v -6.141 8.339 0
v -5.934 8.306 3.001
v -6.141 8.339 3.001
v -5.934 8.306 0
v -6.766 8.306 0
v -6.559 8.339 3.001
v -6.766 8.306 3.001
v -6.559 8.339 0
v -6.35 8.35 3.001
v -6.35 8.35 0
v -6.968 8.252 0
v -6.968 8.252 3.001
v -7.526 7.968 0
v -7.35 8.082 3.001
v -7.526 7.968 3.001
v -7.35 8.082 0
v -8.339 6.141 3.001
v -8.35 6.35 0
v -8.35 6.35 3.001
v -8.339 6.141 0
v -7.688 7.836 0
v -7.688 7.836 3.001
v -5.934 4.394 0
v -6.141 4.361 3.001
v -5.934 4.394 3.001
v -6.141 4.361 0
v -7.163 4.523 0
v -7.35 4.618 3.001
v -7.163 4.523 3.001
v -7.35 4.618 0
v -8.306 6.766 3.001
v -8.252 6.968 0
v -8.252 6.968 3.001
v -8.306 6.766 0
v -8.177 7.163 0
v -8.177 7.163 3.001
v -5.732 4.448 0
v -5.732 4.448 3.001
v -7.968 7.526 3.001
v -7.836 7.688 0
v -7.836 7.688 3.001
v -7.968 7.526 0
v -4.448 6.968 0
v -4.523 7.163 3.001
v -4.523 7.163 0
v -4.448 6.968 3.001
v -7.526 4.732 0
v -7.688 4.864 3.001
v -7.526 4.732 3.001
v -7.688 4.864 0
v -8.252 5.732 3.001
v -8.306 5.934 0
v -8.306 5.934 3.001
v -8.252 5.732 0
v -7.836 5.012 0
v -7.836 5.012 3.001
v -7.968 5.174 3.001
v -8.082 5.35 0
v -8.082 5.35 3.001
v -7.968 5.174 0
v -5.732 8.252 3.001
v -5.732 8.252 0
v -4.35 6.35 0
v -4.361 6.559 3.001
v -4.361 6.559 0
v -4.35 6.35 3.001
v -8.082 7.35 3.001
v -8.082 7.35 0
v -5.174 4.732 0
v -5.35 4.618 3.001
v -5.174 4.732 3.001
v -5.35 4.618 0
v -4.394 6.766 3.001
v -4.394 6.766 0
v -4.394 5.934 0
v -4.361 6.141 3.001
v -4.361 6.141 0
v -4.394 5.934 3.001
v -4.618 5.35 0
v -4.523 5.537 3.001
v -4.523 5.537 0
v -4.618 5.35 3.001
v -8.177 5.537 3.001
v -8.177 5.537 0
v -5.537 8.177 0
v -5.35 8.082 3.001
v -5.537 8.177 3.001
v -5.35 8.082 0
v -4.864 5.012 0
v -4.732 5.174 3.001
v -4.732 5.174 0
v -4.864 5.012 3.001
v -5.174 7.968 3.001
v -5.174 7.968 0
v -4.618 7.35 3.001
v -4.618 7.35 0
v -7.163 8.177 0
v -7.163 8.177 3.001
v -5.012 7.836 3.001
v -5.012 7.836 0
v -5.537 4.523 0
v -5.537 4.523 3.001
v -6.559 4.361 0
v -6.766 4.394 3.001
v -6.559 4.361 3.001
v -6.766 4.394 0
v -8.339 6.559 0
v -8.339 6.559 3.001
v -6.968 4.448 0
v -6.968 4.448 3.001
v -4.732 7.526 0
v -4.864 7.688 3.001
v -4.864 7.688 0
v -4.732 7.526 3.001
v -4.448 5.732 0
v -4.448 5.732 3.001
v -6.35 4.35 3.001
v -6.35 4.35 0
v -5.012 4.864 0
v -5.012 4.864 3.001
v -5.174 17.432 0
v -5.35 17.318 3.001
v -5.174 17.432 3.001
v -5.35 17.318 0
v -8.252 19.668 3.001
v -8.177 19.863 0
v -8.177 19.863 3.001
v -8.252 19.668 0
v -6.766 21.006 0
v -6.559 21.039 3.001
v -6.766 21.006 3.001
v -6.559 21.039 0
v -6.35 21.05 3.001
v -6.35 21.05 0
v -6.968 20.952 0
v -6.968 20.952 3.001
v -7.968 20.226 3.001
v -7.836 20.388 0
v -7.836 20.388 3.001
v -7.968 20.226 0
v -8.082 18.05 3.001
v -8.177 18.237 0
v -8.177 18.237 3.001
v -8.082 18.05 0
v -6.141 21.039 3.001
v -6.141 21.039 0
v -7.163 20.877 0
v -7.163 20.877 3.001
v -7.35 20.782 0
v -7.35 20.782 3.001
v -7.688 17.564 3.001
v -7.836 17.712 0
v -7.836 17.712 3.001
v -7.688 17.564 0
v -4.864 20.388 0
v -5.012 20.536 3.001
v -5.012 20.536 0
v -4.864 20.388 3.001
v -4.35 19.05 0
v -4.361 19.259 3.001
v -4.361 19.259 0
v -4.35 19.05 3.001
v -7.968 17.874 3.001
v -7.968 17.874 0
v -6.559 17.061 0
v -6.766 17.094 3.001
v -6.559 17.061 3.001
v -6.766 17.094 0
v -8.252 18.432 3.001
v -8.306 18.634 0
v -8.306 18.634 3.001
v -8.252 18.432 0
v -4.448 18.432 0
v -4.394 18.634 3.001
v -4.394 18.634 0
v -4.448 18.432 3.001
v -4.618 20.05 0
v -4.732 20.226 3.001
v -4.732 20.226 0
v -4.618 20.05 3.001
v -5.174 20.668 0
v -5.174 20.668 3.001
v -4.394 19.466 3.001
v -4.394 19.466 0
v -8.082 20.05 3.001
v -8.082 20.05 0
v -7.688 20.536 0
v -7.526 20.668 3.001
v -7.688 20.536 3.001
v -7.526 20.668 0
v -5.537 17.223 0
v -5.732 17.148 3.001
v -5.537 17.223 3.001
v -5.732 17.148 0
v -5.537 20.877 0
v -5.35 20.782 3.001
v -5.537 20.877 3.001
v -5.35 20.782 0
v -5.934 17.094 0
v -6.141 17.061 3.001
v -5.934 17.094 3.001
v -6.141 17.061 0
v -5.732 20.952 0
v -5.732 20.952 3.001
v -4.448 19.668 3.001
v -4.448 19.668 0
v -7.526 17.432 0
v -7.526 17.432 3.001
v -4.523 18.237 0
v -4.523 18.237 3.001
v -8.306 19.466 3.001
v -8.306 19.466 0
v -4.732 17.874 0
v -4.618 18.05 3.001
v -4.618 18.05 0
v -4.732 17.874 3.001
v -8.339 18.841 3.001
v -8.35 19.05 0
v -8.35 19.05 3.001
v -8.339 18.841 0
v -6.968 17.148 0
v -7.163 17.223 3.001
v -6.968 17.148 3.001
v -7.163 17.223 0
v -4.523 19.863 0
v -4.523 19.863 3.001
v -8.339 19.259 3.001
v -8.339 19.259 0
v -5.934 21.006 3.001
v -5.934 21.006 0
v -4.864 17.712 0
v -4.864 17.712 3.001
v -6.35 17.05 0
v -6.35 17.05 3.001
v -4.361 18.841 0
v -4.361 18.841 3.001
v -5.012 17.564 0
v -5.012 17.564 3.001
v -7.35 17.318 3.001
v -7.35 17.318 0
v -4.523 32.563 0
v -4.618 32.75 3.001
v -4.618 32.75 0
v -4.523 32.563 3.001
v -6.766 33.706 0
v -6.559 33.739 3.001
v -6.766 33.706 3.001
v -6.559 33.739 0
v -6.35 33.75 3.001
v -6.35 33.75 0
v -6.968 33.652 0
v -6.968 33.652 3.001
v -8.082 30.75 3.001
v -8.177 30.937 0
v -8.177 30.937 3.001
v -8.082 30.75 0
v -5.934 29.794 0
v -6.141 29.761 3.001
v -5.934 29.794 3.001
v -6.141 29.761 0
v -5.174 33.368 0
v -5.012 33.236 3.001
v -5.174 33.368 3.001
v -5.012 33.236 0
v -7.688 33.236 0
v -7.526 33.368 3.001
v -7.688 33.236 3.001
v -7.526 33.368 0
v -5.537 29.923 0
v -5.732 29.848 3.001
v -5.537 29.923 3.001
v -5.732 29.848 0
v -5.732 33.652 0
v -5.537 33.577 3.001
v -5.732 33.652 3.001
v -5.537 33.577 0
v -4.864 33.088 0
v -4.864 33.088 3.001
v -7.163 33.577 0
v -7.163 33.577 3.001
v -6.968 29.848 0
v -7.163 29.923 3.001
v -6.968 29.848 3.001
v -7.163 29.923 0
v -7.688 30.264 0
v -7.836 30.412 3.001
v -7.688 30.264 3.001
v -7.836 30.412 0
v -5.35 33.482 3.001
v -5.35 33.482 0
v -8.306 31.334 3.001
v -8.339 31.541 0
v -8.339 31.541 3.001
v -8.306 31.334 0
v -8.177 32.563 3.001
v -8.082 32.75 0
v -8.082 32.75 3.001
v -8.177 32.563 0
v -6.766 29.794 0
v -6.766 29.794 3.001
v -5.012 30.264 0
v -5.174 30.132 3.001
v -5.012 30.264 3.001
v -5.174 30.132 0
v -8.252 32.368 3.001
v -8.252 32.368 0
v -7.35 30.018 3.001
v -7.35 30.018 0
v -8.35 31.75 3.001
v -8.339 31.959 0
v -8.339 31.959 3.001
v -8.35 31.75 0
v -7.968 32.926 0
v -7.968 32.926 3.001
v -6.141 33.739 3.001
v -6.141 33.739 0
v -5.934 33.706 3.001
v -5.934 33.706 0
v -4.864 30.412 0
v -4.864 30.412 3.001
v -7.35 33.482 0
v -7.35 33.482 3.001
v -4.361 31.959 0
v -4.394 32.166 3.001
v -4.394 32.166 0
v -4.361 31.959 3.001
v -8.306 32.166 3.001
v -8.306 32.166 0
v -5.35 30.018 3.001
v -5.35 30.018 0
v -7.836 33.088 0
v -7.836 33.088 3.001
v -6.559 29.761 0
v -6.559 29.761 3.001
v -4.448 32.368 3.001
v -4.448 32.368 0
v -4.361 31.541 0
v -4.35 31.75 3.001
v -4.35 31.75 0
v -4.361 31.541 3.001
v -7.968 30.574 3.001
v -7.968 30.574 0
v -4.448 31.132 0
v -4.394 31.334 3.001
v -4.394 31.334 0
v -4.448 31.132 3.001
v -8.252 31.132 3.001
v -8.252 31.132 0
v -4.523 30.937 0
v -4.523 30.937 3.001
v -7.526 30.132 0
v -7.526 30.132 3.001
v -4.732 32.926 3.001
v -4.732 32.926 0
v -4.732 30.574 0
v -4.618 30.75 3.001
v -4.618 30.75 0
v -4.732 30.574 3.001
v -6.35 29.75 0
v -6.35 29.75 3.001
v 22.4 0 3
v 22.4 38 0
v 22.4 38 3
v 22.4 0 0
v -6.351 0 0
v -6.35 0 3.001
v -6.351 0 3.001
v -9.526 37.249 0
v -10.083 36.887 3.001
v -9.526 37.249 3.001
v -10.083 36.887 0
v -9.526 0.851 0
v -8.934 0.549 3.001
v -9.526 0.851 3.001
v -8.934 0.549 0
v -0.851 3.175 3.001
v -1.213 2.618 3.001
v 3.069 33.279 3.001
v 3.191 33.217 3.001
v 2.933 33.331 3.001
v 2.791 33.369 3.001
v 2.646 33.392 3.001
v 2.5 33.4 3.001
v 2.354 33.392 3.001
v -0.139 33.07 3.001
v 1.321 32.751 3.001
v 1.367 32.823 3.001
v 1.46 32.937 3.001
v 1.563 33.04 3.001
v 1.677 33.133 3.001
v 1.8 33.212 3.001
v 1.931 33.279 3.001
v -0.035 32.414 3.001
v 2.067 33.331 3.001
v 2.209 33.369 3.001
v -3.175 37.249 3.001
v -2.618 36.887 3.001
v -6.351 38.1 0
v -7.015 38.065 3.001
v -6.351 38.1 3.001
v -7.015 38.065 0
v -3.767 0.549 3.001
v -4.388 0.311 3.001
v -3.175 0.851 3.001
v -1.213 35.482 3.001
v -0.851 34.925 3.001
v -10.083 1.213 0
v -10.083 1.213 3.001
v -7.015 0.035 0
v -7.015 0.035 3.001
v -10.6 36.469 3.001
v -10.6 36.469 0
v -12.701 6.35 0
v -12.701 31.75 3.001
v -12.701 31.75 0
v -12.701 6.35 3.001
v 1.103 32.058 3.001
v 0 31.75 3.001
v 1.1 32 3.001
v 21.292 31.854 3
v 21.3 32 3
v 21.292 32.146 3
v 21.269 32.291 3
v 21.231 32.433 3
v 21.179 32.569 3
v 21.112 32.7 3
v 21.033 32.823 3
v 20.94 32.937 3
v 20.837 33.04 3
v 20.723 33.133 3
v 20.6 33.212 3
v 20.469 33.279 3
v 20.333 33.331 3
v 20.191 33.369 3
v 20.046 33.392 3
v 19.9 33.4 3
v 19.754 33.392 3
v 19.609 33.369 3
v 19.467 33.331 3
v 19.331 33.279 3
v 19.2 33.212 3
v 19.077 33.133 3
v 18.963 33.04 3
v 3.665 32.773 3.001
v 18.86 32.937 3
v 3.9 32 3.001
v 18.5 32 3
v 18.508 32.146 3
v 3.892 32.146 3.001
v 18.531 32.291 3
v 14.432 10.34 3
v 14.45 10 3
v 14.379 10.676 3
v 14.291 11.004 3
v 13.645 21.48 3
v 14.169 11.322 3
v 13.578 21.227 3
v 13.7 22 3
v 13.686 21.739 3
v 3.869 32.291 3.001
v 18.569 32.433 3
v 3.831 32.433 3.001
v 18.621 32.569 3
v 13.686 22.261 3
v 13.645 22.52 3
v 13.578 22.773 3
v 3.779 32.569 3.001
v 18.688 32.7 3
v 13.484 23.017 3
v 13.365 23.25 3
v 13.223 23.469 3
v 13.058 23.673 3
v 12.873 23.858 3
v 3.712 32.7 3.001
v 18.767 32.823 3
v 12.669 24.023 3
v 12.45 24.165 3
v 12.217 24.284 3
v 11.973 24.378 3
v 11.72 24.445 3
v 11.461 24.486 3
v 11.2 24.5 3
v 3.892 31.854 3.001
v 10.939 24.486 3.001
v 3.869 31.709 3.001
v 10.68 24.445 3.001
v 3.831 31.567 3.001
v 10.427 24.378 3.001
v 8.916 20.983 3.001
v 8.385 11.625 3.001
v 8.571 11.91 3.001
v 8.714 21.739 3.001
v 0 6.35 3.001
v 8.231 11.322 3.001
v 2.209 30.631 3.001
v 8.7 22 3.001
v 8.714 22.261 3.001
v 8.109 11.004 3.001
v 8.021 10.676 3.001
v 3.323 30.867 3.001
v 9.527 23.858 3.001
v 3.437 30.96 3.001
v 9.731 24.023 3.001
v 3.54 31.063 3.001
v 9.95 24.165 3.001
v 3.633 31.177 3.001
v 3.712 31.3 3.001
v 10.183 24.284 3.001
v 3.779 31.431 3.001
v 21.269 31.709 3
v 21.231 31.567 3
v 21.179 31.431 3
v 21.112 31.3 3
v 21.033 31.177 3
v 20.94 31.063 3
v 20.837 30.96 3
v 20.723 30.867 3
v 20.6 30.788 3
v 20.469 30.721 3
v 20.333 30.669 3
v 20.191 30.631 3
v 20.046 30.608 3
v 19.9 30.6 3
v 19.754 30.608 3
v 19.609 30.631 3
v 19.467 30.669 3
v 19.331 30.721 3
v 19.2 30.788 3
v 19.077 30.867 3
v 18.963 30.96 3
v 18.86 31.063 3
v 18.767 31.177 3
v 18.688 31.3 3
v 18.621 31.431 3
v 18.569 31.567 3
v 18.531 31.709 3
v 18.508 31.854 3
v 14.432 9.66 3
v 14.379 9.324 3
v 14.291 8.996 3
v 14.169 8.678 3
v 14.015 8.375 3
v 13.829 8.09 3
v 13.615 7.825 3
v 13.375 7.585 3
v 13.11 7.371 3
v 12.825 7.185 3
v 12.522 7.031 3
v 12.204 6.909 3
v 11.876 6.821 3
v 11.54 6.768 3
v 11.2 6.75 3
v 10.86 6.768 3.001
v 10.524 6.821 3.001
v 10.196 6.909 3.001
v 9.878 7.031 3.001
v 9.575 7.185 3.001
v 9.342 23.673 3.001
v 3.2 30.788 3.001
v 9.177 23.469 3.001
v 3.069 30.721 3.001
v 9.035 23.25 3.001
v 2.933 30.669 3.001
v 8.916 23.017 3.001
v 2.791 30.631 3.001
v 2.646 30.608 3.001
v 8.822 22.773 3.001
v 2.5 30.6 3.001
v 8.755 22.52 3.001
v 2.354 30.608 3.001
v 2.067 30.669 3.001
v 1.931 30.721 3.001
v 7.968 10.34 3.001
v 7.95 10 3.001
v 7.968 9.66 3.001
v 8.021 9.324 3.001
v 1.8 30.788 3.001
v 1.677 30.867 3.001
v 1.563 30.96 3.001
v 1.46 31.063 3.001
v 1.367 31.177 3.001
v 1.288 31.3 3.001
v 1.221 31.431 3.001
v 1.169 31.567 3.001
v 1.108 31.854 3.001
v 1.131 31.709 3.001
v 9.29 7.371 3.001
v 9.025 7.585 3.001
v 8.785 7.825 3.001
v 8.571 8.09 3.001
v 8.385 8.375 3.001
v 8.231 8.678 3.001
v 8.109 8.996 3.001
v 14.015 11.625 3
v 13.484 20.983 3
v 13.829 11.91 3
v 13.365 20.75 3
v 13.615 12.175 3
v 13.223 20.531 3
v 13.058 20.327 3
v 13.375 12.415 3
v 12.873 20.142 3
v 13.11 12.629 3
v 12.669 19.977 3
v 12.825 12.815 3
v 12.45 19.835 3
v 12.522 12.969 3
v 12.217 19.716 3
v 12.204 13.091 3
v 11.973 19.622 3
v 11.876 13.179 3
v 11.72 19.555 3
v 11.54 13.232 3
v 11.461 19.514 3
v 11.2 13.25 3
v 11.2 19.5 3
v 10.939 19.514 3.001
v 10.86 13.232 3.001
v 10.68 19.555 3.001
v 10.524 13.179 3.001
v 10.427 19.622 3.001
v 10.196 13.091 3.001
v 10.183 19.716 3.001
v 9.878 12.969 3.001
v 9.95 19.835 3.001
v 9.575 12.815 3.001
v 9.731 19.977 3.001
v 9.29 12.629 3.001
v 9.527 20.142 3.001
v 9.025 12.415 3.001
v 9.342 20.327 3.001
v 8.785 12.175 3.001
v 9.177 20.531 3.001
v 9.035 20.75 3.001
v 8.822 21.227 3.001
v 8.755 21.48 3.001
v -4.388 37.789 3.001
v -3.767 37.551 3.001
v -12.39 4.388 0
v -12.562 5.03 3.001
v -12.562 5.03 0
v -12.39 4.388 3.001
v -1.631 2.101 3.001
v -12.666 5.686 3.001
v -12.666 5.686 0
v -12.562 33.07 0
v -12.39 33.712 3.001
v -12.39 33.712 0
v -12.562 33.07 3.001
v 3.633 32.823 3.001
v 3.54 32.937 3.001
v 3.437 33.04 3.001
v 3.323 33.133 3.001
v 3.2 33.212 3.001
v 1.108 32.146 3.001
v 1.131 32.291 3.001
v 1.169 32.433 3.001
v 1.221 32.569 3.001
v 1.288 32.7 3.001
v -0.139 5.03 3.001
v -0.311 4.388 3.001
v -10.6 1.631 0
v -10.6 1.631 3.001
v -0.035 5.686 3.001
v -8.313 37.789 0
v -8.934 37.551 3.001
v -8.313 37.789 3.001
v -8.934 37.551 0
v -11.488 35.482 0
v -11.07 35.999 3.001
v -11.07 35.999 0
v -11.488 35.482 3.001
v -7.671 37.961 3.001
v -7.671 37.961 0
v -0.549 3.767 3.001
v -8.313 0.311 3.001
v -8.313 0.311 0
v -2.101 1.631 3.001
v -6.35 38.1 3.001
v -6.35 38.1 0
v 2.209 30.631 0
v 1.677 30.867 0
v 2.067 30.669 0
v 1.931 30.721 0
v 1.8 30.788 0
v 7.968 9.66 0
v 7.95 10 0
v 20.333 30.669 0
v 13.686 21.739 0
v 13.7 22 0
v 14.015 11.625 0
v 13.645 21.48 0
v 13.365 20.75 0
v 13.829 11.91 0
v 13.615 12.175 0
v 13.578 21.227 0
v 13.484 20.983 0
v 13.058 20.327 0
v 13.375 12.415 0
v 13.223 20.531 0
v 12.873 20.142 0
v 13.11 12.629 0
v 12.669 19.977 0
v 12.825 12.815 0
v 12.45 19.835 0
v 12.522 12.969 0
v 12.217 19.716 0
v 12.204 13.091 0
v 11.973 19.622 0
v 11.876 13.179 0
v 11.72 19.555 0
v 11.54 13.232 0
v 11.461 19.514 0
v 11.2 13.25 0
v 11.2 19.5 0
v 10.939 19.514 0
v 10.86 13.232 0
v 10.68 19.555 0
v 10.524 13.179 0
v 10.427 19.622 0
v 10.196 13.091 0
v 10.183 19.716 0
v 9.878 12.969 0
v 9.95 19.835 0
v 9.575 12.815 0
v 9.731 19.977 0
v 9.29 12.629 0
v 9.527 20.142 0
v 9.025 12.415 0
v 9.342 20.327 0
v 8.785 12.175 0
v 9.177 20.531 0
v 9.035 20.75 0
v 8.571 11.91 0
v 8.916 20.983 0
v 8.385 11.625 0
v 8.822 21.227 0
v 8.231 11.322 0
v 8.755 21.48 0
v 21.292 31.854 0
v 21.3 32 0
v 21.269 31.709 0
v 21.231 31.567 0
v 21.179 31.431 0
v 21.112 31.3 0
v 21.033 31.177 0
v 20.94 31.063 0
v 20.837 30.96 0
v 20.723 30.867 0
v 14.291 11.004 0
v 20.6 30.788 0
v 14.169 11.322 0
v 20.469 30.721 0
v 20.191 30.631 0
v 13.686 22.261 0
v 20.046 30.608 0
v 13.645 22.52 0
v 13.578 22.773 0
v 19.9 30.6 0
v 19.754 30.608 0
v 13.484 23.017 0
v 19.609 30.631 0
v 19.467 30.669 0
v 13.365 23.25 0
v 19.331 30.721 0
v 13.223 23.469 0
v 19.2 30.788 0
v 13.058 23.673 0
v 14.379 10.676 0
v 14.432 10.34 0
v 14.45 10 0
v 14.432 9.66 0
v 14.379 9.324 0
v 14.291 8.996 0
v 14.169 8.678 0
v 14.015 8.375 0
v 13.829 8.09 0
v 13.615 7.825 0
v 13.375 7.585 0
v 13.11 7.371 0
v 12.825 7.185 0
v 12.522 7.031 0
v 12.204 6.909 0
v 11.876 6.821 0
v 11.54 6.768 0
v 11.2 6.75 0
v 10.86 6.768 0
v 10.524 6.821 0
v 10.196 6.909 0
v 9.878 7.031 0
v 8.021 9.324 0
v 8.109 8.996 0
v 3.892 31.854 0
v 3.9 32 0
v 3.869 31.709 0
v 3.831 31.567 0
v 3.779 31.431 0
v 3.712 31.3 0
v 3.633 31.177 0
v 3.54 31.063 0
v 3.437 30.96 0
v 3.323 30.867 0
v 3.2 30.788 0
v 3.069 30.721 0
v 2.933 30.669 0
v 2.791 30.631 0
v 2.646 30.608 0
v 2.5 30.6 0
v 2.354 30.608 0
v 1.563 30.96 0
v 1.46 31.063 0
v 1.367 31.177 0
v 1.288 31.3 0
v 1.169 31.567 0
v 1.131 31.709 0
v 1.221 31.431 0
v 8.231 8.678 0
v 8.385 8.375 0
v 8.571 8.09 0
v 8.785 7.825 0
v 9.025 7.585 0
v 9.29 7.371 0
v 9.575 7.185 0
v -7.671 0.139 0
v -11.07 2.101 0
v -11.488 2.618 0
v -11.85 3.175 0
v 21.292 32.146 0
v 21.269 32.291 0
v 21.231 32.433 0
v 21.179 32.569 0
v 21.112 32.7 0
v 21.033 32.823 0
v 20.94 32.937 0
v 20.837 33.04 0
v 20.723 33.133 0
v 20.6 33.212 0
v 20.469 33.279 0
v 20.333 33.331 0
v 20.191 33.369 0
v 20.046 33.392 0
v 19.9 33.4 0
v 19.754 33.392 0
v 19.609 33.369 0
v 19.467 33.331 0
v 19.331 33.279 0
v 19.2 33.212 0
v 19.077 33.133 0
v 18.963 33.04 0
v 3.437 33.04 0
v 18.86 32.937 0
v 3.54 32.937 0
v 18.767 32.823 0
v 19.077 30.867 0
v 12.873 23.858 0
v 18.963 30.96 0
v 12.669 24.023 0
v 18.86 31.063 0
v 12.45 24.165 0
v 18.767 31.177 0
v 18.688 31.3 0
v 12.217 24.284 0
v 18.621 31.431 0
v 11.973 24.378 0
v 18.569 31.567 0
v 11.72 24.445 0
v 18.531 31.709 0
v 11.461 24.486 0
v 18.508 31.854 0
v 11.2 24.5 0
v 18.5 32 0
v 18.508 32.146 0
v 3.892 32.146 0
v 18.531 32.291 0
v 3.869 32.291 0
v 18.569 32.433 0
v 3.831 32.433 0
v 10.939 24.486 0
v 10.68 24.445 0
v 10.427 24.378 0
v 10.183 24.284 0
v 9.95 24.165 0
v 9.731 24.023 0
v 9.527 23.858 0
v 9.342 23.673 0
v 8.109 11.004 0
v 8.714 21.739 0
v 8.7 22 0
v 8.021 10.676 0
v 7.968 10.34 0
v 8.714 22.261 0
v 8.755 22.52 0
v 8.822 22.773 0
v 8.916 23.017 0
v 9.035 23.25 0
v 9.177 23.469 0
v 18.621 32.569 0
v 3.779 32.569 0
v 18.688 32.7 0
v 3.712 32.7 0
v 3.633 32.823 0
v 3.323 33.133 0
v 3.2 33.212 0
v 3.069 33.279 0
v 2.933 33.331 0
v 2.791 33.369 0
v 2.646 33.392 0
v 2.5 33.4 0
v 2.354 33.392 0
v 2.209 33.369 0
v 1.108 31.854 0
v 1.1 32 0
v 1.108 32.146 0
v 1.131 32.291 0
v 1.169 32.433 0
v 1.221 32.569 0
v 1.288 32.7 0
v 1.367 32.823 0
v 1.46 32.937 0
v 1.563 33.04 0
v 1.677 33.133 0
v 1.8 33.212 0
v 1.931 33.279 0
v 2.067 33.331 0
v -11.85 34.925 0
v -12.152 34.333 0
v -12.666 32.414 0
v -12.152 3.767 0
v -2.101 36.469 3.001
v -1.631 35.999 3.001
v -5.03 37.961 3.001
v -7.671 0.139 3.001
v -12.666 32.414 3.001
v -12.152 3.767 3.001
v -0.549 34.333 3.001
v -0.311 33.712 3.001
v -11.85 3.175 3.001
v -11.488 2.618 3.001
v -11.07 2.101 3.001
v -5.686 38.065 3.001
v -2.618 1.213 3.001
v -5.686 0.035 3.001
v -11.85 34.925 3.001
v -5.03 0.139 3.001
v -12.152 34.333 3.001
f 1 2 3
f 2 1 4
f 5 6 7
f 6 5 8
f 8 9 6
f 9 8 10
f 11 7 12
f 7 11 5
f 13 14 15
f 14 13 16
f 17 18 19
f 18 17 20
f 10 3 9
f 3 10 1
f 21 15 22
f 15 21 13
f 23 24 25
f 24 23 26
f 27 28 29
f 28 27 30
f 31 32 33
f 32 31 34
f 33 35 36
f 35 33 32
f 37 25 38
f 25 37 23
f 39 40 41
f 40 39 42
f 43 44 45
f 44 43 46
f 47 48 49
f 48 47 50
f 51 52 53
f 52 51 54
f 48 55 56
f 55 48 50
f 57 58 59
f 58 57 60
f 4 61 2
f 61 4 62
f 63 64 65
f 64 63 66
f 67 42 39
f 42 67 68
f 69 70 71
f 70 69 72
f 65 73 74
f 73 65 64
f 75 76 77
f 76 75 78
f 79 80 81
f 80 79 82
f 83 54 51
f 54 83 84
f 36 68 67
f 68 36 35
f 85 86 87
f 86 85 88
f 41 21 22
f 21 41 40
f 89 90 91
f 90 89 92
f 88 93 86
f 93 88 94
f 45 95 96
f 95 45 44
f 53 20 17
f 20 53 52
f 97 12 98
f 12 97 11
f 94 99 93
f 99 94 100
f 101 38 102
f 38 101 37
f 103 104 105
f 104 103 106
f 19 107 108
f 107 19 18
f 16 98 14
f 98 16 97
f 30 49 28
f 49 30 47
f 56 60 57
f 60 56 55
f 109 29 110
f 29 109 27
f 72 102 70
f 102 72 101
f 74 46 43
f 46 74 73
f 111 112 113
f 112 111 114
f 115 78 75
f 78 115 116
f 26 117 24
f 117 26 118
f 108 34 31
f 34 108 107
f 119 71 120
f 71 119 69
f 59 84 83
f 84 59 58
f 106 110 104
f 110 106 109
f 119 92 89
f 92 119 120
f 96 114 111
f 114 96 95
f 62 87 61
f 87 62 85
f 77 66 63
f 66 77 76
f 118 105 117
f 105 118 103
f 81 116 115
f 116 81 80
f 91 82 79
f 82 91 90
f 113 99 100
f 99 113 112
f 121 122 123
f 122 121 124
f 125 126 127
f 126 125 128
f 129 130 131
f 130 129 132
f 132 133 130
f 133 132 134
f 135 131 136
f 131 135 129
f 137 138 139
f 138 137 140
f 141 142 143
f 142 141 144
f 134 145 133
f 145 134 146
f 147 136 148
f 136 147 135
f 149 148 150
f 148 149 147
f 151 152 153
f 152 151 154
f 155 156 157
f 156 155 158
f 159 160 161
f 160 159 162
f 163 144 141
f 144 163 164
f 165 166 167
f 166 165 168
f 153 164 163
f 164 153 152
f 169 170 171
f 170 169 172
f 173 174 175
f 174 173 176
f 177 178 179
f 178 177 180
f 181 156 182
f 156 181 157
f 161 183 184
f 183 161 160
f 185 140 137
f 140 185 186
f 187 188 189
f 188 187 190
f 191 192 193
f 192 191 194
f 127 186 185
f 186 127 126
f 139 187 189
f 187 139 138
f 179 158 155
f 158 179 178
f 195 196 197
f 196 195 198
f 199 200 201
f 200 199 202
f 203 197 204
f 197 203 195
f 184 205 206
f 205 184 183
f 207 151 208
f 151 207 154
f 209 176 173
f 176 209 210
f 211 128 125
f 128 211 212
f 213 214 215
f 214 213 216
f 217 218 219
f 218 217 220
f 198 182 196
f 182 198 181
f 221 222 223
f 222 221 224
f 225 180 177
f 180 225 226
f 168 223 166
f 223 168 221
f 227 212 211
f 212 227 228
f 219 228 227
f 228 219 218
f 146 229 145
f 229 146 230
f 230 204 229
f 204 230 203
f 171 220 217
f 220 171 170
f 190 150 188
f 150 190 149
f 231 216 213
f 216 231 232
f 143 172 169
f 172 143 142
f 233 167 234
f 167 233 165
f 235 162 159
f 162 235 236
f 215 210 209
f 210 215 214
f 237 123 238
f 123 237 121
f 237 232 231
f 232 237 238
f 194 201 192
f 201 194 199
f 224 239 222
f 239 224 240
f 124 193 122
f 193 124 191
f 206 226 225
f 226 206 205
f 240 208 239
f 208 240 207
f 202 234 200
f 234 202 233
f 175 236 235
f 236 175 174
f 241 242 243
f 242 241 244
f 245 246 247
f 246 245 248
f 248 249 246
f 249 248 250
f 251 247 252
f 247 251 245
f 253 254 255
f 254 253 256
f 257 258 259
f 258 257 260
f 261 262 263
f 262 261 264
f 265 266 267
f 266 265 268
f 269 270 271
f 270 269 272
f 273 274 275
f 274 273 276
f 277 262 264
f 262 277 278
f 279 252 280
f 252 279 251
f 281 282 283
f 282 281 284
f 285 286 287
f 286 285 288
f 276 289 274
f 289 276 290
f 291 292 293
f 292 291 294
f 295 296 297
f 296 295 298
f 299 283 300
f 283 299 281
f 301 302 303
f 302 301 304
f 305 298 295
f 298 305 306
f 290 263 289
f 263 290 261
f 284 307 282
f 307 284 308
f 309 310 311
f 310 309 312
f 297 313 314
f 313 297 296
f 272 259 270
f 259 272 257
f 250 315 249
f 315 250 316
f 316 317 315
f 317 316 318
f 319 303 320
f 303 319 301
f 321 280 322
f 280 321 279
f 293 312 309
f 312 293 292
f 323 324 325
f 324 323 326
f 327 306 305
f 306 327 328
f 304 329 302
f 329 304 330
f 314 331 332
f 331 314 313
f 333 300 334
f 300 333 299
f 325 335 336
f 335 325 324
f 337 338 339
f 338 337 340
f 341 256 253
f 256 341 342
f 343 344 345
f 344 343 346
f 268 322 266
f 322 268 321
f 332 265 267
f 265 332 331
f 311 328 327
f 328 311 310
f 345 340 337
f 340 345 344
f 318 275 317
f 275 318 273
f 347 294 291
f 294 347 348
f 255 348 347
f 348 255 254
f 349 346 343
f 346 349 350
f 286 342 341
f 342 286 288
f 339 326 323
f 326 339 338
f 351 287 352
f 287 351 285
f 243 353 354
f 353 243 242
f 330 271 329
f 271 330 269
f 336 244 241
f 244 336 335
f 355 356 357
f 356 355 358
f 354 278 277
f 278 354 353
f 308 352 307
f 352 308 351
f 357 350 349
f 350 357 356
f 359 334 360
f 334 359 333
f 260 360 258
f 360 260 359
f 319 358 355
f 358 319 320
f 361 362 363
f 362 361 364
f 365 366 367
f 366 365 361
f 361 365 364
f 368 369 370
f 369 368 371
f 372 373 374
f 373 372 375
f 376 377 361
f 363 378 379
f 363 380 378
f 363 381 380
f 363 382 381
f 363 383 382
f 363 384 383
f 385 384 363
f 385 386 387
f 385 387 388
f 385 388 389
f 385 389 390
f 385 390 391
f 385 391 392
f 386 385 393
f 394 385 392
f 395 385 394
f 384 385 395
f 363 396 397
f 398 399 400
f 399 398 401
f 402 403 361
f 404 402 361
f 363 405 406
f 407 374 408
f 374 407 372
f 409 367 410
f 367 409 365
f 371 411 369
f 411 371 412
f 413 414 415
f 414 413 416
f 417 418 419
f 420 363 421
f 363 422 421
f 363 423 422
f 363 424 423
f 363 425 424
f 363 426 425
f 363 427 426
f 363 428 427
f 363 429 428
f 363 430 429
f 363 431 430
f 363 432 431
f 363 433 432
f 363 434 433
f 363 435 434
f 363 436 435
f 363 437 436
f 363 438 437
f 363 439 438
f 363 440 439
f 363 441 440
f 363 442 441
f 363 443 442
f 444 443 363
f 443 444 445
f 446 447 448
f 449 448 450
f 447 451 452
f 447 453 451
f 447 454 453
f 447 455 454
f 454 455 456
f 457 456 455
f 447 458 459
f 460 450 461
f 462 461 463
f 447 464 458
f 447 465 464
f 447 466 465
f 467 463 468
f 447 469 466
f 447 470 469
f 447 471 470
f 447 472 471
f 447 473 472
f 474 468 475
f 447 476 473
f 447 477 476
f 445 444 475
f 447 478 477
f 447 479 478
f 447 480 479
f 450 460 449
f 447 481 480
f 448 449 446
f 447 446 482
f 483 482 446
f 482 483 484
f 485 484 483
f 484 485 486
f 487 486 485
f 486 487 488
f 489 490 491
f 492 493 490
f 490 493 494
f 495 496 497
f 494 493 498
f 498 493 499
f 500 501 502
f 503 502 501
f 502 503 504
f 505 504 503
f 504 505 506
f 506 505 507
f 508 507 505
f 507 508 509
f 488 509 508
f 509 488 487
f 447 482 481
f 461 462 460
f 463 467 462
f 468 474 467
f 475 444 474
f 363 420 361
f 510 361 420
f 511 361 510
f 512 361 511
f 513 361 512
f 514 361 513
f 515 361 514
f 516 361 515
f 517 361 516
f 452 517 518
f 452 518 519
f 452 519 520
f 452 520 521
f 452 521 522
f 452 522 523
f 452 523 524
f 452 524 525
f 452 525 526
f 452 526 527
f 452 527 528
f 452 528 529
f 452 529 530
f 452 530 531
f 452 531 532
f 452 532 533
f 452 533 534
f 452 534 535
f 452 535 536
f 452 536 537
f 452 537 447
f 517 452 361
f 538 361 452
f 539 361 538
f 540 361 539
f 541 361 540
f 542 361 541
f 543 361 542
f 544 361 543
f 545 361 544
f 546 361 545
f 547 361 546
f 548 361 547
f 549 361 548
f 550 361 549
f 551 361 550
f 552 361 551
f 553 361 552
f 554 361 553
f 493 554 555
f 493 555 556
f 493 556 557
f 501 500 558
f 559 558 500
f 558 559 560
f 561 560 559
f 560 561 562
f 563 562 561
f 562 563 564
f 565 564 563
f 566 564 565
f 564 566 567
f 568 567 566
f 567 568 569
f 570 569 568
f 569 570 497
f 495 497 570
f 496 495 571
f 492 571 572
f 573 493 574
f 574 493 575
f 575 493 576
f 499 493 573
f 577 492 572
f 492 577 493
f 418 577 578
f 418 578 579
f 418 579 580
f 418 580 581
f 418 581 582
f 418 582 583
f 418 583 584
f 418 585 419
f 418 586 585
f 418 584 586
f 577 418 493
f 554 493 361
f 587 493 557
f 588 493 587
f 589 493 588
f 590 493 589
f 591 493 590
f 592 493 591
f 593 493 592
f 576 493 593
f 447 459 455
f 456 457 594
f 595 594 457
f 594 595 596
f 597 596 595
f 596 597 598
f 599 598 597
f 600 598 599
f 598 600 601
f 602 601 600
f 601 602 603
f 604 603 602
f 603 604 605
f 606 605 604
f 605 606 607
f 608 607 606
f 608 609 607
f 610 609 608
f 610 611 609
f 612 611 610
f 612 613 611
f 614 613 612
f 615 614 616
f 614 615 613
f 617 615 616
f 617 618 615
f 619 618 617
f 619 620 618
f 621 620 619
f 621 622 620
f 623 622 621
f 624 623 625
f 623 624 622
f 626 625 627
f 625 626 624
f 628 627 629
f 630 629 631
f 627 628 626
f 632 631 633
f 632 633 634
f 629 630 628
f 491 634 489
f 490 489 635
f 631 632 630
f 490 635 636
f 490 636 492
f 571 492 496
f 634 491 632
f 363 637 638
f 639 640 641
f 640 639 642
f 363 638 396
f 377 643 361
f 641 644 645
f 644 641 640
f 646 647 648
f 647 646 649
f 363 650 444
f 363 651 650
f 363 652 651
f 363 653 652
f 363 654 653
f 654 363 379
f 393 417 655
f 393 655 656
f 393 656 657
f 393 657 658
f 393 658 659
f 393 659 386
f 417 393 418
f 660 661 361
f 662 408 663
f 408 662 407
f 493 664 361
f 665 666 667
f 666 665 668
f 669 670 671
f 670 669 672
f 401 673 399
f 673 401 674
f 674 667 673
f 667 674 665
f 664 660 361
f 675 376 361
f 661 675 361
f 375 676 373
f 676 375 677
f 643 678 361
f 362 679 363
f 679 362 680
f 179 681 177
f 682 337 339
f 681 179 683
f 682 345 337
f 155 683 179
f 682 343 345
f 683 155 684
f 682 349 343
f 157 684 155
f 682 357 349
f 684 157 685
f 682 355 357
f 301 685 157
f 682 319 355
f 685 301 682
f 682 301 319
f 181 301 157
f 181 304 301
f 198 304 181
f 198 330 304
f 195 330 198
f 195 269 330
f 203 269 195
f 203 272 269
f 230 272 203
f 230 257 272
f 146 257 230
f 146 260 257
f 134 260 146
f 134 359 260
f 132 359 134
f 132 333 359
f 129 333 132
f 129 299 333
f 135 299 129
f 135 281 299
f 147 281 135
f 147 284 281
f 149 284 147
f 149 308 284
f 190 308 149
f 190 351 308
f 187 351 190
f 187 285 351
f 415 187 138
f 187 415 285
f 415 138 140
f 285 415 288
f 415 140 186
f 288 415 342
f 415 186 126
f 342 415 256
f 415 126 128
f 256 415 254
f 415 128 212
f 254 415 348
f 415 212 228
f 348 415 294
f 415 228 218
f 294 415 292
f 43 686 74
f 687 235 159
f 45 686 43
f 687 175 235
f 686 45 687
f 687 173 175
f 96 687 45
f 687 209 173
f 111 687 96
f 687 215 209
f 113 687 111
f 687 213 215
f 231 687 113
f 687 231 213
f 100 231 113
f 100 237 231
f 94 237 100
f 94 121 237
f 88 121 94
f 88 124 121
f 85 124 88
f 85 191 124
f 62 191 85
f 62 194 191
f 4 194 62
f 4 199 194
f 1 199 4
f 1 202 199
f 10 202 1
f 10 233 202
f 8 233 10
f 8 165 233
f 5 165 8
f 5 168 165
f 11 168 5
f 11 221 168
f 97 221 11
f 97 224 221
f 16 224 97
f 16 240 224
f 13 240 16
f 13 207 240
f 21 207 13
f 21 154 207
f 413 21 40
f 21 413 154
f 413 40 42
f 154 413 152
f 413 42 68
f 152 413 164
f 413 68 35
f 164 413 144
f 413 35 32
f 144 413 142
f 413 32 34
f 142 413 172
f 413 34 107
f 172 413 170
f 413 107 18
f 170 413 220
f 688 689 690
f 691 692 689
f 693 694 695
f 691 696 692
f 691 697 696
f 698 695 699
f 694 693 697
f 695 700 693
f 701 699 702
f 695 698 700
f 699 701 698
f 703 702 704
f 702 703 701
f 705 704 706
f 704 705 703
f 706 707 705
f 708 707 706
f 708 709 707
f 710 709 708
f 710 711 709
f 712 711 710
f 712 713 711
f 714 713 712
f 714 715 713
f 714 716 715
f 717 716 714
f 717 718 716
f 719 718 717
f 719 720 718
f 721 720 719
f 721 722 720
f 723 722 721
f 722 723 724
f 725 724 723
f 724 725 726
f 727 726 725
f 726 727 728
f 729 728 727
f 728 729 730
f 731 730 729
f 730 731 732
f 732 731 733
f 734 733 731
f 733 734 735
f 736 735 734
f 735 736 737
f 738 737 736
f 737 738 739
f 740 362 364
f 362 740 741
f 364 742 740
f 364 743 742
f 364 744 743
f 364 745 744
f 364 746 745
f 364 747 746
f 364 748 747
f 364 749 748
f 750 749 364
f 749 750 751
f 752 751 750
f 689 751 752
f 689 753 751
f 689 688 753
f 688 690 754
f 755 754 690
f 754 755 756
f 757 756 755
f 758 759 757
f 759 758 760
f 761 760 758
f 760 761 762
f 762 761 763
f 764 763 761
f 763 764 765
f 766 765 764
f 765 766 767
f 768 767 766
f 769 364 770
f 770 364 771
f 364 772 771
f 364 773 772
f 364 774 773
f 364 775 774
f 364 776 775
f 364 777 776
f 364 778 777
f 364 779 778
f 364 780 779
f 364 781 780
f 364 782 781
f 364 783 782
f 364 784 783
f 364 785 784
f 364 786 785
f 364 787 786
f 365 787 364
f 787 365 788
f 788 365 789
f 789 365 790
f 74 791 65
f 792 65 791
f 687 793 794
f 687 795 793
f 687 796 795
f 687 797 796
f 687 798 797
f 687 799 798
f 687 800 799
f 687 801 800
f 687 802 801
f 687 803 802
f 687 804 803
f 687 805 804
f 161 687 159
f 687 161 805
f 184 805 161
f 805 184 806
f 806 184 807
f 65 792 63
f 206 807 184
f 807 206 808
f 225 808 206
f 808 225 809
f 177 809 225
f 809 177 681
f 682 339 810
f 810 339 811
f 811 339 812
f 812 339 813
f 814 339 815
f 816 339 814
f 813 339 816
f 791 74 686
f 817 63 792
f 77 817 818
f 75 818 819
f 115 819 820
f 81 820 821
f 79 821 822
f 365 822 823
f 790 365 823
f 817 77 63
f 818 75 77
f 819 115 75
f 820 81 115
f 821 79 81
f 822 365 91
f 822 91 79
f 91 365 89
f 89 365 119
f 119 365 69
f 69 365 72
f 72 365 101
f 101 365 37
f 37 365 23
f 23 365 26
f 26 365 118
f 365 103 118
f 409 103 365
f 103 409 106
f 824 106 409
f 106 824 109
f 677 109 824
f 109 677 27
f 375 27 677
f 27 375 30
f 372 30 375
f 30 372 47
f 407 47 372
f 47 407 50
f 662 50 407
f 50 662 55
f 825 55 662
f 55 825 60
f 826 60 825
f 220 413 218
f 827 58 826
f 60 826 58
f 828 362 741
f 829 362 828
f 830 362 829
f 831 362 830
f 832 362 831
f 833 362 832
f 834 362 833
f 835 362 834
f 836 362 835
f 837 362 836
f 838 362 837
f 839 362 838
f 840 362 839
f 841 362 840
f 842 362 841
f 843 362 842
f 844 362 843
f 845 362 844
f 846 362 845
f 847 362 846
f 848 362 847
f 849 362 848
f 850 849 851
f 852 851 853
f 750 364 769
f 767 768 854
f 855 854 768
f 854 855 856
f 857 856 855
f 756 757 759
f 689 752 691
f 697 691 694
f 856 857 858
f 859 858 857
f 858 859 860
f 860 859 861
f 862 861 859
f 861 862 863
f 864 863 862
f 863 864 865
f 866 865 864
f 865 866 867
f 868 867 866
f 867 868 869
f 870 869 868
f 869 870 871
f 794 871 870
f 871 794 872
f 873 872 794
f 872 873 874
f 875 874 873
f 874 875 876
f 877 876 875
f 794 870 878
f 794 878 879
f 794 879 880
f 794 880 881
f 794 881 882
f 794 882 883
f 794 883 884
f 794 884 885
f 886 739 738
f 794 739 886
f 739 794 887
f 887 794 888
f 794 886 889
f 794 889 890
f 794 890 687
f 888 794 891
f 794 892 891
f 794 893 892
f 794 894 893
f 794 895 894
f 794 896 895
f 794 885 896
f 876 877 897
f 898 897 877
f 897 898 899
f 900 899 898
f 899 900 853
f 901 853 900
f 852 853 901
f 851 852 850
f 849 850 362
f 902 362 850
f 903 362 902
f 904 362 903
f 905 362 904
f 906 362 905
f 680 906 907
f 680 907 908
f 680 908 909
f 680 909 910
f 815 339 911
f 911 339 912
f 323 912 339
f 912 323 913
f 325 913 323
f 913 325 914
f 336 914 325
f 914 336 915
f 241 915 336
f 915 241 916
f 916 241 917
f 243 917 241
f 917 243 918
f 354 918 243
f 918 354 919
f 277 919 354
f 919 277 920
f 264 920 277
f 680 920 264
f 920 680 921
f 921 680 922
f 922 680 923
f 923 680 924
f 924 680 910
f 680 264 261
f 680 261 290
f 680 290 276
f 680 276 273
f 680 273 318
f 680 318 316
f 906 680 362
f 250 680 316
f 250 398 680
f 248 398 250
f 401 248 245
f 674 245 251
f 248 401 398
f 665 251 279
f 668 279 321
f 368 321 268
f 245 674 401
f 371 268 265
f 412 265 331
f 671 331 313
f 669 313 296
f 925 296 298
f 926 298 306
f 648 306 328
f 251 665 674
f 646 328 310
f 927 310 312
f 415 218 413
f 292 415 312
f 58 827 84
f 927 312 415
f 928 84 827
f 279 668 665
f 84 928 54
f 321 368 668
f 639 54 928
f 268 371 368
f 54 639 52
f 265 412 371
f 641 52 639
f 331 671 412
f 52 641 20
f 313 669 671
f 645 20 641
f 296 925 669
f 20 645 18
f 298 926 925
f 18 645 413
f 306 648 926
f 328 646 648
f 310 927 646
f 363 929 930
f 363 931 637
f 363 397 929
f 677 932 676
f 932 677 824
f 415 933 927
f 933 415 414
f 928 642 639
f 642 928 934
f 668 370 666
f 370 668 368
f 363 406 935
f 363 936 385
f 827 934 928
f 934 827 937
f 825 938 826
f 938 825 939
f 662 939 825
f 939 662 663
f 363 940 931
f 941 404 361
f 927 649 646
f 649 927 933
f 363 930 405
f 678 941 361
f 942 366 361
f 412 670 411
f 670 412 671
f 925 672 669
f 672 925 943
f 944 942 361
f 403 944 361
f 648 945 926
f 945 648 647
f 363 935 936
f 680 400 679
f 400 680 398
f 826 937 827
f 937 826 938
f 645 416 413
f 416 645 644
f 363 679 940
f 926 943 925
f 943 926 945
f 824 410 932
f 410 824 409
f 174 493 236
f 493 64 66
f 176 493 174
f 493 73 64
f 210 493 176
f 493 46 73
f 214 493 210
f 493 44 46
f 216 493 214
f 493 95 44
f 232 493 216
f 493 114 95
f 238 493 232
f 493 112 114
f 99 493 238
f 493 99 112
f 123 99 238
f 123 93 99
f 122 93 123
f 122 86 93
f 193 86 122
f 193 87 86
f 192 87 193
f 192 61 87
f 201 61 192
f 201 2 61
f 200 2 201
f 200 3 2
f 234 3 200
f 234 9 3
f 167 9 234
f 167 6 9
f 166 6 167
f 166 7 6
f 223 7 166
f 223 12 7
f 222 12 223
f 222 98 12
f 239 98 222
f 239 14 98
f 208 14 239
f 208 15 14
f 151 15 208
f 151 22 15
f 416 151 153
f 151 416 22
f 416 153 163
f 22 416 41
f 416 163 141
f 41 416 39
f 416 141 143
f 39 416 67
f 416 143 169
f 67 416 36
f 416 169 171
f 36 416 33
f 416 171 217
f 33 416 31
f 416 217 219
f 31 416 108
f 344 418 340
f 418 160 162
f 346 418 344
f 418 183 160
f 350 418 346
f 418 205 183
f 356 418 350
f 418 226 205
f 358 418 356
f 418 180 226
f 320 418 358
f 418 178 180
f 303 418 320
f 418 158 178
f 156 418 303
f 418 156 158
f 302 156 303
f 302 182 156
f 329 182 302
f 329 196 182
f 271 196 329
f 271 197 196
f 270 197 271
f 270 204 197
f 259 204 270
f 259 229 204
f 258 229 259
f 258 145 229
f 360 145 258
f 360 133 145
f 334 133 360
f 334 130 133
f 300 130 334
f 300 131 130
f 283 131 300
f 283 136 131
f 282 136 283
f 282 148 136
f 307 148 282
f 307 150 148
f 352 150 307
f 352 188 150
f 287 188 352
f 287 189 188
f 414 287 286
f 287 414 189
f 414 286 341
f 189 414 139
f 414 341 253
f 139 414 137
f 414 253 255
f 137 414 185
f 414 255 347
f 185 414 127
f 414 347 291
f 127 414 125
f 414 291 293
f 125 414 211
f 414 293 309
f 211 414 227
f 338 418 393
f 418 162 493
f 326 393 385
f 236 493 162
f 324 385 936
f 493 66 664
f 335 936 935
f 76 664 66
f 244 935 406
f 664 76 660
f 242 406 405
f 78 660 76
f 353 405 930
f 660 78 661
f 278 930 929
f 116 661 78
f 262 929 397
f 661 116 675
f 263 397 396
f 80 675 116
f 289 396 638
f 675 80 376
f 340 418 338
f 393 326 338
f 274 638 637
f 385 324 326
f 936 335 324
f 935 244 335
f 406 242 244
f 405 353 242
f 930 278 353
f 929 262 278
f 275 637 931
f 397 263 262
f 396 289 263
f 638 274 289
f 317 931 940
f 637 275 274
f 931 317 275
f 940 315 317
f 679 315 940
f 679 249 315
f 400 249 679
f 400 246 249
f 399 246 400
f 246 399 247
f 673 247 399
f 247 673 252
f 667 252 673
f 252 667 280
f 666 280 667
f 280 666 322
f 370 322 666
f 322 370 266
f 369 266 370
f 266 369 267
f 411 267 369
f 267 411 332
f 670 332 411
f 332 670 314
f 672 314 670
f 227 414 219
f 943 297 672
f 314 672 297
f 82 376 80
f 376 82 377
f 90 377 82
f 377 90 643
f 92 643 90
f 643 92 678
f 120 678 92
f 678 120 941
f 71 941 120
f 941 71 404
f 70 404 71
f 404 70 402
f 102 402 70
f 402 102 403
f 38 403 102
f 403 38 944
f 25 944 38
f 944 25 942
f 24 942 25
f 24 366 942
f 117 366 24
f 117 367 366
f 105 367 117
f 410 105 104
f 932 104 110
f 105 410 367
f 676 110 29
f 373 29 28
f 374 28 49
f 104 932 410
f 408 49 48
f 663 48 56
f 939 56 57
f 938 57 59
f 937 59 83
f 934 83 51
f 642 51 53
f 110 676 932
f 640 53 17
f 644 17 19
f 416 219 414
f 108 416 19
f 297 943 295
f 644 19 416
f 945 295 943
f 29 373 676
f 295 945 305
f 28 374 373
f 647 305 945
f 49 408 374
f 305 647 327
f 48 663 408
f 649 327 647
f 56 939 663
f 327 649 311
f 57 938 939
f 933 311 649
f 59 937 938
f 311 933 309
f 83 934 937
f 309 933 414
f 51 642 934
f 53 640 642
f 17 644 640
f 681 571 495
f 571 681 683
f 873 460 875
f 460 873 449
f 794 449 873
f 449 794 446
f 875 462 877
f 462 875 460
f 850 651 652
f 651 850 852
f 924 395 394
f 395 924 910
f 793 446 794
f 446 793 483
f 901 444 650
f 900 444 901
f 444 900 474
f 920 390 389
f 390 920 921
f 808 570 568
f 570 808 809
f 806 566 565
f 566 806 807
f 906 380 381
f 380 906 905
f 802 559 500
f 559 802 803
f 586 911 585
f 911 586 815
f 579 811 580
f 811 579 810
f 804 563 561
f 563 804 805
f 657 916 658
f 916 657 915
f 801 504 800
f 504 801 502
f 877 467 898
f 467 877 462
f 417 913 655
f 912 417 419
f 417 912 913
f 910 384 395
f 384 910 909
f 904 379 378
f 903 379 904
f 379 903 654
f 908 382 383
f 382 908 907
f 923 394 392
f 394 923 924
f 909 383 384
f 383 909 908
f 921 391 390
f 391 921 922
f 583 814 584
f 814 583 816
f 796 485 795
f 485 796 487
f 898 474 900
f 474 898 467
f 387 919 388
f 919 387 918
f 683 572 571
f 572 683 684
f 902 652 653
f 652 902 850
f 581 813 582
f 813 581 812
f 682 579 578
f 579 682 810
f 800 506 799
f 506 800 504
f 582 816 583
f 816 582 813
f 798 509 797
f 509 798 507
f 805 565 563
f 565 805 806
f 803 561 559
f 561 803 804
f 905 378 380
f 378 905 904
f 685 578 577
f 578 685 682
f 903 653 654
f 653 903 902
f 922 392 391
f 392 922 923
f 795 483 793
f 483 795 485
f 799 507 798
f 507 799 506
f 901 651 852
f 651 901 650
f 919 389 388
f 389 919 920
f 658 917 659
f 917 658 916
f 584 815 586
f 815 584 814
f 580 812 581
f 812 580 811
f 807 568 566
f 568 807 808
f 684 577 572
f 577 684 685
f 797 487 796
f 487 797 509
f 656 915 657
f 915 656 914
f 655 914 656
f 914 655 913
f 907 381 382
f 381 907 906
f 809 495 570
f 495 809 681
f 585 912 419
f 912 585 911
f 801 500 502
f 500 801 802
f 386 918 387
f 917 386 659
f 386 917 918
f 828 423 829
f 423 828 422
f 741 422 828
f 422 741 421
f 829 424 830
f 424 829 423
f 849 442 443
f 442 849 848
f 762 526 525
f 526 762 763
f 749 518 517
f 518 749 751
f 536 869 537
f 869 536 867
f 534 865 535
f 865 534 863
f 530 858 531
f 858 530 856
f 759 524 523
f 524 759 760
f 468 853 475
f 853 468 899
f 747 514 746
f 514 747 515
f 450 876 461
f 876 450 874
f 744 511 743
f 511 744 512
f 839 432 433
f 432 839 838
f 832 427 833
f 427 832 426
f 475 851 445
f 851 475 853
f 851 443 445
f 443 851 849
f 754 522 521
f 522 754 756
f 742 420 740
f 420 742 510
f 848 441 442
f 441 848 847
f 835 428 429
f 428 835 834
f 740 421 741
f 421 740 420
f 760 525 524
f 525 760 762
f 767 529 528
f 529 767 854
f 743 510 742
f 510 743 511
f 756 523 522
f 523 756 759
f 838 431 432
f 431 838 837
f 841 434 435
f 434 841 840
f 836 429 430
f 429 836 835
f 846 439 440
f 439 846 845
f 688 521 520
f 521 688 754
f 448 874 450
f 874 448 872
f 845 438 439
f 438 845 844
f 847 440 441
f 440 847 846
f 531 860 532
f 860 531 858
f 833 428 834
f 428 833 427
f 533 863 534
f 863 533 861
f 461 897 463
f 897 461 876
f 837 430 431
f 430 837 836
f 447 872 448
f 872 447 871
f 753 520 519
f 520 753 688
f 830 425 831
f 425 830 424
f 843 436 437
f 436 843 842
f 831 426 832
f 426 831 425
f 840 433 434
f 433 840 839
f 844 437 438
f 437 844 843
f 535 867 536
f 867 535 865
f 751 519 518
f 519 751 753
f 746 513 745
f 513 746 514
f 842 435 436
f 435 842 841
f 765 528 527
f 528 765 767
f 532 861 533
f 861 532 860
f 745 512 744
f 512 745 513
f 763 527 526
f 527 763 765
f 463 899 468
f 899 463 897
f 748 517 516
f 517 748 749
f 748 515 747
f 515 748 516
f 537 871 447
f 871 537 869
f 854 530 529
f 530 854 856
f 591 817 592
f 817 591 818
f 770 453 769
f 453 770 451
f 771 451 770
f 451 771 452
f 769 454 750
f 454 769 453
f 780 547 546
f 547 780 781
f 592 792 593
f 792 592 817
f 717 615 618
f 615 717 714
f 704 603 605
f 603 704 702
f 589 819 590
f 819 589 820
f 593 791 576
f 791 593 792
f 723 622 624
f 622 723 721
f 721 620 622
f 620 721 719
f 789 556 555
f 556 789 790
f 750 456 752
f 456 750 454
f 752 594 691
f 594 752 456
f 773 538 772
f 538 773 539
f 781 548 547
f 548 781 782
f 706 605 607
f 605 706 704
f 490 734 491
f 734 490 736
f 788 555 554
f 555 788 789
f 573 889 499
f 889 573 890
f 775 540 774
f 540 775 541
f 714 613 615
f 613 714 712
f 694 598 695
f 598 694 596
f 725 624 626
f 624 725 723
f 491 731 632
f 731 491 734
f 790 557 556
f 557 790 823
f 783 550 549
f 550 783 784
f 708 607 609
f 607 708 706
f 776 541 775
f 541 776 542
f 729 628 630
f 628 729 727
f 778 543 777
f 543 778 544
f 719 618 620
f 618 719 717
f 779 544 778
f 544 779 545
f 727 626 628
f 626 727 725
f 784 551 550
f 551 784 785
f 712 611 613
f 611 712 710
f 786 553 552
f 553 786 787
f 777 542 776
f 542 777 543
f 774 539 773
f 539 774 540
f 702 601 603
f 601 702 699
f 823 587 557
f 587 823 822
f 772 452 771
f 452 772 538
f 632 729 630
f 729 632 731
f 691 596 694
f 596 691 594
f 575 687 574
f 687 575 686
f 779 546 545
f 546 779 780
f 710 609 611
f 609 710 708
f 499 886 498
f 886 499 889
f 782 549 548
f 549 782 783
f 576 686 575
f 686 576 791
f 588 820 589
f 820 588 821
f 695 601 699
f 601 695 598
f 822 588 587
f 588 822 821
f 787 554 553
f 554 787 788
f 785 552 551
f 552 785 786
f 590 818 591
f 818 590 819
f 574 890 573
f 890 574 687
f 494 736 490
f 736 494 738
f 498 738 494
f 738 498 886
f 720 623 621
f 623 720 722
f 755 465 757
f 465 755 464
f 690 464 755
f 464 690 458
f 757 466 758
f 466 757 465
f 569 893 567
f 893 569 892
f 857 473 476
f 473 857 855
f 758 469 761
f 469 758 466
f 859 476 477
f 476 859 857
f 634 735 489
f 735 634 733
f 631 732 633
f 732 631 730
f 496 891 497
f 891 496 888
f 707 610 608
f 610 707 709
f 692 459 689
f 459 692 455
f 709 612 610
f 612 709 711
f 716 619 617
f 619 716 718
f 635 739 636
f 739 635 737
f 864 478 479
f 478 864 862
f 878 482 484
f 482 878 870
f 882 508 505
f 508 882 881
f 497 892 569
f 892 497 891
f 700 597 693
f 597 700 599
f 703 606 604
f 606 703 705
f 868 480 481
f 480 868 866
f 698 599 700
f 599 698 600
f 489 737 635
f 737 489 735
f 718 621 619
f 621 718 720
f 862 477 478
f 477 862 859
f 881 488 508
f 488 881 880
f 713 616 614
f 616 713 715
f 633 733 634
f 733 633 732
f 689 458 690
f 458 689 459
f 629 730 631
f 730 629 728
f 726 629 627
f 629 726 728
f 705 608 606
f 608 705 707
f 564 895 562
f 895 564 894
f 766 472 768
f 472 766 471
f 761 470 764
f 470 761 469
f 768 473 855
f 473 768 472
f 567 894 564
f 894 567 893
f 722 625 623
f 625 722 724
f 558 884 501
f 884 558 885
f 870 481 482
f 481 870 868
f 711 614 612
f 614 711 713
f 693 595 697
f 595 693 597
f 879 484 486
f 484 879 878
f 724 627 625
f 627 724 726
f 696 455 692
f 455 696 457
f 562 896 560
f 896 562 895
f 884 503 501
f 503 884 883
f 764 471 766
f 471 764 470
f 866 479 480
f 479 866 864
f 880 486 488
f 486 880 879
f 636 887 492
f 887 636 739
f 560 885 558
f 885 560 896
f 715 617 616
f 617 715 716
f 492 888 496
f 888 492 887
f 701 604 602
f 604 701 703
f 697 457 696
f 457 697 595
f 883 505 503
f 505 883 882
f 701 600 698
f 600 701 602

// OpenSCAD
$fn=60;

difference(){
hull(){
cube([22.4,38,3]);
translate([-6.35,6.35,0])rotate([0,0,90])
meccano(n=3);
}
translate([2.5,32,-1])cylinder(d=2.8,h=5);
translate([19.9,32,-1])cylinder(d=2.8,h=5);
translate([11.2,10,-1])cylinder(d=6.5,h=5);    
translate([11.2,22,-1])cylinder(d=5,h=5);
translate([-6.35,6.35,0])rotate([0,0,90])
    for (i=[0:2]){
        translate([i*12.7,0,-1])cylinder(d=4,h=5);
    }

}
module meccano(n=2){
difference(){
    minkowski(){
        cylinder(d=12.7,h=3);
        cube([(n-1)*12.7,.001,0.001]);
    }
    for (i=[0:n-1]){
        translate([i*12.7,0,-1])cylinder(d=4,h=5);
    }
}
}
